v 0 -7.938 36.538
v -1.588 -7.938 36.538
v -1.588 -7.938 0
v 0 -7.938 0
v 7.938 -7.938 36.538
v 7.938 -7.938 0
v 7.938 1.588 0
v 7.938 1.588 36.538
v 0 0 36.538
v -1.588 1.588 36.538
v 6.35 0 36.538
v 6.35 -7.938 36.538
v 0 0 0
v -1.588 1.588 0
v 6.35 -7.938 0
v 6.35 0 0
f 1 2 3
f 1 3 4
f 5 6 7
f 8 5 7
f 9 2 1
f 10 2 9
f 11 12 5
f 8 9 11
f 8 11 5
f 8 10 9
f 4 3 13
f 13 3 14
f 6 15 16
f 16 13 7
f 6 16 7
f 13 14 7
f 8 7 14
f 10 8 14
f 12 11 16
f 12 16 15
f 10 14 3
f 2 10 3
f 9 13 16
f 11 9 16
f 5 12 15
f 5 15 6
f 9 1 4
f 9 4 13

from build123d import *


with BuildPart() as part:
    # Sweep3: sweep along a path in Sketch3
    with BuildLine(Plane(origin=(0, 0, 0), x_dir=(0, 0, -1), z_dir=(1, 0, 0))) as sweep3_path:
        Line((0, 0), (-36.5379, 0))
    # Sketch2 → Sweep3 (sweep)
    with BuildSketch(Plane.XY):
        Polygon((0, 0), (6.35, 0), (6.35, -7.9375), (7.9375, -7.9375), (7.9375, 1.5875), (-1.5875, 1.5875), (-1.5875, -7.9375), (0, -7.9375), align=None)
    sweep(path=sweep3_path.line)


solid = part.part
